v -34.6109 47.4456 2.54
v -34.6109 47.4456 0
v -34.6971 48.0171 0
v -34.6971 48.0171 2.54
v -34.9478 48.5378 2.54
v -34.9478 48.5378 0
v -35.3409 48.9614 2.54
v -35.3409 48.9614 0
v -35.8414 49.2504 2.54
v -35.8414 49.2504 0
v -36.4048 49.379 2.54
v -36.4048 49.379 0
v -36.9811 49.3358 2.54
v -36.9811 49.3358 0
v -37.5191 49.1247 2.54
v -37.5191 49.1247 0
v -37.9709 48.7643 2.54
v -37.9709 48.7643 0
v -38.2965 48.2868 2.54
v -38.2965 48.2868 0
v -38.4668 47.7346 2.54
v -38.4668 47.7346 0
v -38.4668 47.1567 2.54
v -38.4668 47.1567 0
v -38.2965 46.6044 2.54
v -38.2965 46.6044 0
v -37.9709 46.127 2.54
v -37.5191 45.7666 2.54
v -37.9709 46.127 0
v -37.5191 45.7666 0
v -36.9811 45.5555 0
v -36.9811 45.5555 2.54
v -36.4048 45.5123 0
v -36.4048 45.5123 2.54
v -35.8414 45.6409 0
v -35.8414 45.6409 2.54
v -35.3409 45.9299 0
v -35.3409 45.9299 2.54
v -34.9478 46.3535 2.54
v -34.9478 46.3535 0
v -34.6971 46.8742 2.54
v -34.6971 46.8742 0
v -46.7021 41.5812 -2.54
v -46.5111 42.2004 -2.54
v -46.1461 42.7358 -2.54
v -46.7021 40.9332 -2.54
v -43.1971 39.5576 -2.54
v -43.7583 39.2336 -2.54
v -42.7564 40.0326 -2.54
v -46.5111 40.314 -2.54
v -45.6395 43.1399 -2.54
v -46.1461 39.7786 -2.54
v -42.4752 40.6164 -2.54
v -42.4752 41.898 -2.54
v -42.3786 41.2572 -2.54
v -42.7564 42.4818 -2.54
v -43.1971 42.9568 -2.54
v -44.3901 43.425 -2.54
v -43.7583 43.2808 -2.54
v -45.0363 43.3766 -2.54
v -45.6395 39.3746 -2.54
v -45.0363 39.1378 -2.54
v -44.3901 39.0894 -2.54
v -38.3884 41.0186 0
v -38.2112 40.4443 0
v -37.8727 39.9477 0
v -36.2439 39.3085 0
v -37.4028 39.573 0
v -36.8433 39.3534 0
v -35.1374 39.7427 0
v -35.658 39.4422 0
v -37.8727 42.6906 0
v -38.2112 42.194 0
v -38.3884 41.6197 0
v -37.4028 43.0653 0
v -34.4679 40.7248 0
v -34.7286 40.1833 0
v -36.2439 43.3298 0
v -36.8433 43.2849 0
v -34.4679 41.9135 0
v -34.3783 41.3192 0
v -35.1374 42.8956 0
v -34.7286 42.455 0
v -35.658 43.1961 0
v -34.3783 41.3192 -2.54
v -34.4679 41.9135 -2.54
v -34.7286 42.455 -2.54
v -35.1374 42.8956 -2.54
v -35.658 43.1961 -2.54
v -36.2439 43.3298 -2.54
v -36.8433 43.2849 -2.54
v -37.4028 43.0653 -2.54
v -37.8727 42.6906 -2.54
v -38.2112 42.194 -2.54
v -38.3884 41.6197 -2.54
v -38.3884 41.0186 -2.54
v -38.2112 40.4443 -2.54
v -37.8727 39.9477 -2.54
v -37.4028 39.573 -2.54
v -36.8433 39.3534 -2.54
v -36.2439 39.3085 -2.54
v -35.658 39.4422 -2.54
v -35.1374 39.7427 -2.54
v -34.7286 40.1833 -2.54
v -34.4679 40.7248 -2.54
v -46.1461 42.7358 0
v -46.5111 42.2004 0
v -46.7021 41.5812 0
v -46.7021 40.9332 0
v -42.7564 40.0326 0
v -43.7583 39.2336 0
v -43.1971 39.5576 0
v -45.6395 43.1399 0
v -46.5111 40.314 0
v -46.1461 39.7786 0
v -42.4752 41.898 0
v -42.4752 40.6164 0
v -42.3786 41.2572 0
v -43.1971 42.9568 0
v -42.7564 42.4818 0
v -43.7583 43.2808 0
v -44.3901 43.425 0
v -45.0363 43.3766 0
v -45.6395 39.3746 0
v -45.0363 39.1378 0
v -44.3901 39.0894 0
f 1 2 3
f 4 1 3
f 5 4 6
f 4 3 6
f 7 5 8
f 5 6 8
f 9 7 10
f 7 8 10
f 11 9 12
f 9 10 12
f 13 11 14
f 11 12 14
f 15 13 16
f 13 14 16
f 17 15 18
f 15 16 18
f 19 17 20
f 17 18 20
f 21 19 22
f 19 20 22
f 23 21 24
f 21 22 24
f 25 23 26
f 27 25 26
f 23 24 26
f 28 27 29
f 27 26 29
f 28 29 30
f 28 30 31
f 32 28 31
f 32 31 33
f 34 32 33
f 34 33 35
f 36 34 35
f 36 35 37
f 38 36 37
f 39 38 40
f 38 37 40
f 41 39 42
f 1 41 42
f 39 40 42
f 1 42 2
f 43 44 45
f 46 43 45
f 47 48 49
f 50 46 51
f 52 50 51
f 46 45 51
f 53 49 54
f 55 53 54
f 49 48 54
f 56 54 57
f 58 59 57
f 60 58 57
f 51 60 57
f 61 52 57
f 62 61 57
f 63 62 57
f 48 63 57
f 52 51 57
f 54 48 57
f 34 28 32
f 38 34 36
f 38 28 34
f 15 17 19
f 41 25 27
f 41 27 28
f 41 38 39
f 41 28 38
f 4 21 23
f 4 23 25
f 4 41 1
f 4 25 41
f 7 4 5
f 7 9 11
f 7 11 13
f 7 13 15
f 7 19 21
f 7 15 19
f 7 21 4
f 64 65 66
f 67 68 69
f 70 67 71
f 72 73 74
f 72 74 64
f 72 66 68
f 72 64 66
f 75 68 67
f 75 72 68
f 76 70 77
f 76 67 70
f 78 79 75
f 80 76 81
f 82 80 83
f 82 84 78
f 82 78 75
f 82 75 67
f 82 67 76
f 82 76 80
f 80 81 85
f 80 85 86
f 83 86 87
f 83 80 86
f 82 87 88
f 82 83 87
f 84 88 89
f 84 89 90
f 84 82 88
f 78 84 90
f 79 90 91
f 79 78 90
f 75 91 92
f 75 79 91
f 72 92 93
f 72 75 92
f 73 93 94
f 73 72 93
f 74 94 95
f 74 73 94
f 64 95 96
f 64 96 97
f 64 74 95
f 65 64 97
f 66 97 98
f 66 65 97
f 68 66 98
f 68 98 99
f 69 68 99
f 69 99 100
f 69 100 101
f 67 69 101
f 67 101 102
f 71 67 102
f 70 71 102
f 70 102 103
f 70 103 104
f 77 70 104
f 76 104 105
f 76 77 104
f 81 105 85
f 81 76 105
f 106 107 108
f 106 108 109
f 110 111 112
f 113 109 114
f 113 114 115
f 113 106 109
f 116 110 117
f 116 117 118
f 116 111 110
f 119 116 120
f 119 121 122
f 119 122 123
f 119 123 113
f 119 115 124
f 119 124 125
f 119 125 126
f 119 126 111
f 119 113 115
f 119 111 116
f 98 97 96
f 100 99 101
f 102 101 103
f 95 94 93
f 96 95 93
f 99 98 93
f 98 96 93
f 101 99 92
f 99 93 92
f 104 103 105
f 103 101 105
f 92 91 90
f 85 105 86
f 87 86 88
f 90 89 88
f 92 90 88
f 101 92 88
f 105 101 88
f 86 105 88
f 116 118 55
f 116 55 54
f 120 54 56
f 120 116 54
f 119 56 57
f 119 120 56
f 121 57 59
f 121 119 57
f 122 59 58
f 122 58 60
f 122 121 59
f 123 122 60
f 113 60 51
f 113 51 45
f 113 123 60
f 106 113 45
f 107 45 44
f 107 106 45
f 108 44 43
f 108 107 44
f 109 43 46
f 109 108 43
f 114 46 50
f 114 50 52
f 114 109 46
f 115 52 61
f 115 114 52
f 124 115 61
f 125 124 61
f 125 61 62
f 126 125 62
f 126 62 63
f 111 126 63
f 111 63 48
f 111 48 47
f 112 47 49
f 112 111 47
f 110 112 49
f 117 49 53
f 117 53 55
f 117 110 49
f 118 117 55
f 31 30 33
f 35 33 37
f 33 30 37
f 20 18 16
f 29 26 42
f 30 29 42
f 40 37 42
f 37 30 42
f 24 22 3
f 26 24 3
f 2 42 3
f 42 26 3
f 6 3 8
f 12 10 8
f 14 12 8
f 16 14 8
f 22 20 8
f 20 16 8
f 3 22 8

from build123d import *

# Parameters (mm, degrees)
F0_R     = 2.173902
F1_R     = 2.016311
F3_DEPTH = 2.54
F2_R     = 1.938761
F4_DEPTH = 2.54


with BuildPart() as f3:
    # F0 (on Top) + F1 (on face) → F3 (new body)
    with BuildSketch(Plane.XY):
        with Locations((-44.55252, 41.257218)):
            Circle(F0_R)
    with BuildSketch(Plane.XY):
        with Locations((-36.394596, 41.319162)):
            Circle(F1_R)
    extrude(amount=-F3_DEPTH)


with BuildPart() as f4:
    # F2 (on Top) → F4 (new body)
    with BuildSketch(Plane.XY):
        with Locations((-36.549695, 47.445644)):
            Circle(F2_R)
    extrude(amount=F4_DEPTH)


solid = Compound([f3.part, f4.part])
